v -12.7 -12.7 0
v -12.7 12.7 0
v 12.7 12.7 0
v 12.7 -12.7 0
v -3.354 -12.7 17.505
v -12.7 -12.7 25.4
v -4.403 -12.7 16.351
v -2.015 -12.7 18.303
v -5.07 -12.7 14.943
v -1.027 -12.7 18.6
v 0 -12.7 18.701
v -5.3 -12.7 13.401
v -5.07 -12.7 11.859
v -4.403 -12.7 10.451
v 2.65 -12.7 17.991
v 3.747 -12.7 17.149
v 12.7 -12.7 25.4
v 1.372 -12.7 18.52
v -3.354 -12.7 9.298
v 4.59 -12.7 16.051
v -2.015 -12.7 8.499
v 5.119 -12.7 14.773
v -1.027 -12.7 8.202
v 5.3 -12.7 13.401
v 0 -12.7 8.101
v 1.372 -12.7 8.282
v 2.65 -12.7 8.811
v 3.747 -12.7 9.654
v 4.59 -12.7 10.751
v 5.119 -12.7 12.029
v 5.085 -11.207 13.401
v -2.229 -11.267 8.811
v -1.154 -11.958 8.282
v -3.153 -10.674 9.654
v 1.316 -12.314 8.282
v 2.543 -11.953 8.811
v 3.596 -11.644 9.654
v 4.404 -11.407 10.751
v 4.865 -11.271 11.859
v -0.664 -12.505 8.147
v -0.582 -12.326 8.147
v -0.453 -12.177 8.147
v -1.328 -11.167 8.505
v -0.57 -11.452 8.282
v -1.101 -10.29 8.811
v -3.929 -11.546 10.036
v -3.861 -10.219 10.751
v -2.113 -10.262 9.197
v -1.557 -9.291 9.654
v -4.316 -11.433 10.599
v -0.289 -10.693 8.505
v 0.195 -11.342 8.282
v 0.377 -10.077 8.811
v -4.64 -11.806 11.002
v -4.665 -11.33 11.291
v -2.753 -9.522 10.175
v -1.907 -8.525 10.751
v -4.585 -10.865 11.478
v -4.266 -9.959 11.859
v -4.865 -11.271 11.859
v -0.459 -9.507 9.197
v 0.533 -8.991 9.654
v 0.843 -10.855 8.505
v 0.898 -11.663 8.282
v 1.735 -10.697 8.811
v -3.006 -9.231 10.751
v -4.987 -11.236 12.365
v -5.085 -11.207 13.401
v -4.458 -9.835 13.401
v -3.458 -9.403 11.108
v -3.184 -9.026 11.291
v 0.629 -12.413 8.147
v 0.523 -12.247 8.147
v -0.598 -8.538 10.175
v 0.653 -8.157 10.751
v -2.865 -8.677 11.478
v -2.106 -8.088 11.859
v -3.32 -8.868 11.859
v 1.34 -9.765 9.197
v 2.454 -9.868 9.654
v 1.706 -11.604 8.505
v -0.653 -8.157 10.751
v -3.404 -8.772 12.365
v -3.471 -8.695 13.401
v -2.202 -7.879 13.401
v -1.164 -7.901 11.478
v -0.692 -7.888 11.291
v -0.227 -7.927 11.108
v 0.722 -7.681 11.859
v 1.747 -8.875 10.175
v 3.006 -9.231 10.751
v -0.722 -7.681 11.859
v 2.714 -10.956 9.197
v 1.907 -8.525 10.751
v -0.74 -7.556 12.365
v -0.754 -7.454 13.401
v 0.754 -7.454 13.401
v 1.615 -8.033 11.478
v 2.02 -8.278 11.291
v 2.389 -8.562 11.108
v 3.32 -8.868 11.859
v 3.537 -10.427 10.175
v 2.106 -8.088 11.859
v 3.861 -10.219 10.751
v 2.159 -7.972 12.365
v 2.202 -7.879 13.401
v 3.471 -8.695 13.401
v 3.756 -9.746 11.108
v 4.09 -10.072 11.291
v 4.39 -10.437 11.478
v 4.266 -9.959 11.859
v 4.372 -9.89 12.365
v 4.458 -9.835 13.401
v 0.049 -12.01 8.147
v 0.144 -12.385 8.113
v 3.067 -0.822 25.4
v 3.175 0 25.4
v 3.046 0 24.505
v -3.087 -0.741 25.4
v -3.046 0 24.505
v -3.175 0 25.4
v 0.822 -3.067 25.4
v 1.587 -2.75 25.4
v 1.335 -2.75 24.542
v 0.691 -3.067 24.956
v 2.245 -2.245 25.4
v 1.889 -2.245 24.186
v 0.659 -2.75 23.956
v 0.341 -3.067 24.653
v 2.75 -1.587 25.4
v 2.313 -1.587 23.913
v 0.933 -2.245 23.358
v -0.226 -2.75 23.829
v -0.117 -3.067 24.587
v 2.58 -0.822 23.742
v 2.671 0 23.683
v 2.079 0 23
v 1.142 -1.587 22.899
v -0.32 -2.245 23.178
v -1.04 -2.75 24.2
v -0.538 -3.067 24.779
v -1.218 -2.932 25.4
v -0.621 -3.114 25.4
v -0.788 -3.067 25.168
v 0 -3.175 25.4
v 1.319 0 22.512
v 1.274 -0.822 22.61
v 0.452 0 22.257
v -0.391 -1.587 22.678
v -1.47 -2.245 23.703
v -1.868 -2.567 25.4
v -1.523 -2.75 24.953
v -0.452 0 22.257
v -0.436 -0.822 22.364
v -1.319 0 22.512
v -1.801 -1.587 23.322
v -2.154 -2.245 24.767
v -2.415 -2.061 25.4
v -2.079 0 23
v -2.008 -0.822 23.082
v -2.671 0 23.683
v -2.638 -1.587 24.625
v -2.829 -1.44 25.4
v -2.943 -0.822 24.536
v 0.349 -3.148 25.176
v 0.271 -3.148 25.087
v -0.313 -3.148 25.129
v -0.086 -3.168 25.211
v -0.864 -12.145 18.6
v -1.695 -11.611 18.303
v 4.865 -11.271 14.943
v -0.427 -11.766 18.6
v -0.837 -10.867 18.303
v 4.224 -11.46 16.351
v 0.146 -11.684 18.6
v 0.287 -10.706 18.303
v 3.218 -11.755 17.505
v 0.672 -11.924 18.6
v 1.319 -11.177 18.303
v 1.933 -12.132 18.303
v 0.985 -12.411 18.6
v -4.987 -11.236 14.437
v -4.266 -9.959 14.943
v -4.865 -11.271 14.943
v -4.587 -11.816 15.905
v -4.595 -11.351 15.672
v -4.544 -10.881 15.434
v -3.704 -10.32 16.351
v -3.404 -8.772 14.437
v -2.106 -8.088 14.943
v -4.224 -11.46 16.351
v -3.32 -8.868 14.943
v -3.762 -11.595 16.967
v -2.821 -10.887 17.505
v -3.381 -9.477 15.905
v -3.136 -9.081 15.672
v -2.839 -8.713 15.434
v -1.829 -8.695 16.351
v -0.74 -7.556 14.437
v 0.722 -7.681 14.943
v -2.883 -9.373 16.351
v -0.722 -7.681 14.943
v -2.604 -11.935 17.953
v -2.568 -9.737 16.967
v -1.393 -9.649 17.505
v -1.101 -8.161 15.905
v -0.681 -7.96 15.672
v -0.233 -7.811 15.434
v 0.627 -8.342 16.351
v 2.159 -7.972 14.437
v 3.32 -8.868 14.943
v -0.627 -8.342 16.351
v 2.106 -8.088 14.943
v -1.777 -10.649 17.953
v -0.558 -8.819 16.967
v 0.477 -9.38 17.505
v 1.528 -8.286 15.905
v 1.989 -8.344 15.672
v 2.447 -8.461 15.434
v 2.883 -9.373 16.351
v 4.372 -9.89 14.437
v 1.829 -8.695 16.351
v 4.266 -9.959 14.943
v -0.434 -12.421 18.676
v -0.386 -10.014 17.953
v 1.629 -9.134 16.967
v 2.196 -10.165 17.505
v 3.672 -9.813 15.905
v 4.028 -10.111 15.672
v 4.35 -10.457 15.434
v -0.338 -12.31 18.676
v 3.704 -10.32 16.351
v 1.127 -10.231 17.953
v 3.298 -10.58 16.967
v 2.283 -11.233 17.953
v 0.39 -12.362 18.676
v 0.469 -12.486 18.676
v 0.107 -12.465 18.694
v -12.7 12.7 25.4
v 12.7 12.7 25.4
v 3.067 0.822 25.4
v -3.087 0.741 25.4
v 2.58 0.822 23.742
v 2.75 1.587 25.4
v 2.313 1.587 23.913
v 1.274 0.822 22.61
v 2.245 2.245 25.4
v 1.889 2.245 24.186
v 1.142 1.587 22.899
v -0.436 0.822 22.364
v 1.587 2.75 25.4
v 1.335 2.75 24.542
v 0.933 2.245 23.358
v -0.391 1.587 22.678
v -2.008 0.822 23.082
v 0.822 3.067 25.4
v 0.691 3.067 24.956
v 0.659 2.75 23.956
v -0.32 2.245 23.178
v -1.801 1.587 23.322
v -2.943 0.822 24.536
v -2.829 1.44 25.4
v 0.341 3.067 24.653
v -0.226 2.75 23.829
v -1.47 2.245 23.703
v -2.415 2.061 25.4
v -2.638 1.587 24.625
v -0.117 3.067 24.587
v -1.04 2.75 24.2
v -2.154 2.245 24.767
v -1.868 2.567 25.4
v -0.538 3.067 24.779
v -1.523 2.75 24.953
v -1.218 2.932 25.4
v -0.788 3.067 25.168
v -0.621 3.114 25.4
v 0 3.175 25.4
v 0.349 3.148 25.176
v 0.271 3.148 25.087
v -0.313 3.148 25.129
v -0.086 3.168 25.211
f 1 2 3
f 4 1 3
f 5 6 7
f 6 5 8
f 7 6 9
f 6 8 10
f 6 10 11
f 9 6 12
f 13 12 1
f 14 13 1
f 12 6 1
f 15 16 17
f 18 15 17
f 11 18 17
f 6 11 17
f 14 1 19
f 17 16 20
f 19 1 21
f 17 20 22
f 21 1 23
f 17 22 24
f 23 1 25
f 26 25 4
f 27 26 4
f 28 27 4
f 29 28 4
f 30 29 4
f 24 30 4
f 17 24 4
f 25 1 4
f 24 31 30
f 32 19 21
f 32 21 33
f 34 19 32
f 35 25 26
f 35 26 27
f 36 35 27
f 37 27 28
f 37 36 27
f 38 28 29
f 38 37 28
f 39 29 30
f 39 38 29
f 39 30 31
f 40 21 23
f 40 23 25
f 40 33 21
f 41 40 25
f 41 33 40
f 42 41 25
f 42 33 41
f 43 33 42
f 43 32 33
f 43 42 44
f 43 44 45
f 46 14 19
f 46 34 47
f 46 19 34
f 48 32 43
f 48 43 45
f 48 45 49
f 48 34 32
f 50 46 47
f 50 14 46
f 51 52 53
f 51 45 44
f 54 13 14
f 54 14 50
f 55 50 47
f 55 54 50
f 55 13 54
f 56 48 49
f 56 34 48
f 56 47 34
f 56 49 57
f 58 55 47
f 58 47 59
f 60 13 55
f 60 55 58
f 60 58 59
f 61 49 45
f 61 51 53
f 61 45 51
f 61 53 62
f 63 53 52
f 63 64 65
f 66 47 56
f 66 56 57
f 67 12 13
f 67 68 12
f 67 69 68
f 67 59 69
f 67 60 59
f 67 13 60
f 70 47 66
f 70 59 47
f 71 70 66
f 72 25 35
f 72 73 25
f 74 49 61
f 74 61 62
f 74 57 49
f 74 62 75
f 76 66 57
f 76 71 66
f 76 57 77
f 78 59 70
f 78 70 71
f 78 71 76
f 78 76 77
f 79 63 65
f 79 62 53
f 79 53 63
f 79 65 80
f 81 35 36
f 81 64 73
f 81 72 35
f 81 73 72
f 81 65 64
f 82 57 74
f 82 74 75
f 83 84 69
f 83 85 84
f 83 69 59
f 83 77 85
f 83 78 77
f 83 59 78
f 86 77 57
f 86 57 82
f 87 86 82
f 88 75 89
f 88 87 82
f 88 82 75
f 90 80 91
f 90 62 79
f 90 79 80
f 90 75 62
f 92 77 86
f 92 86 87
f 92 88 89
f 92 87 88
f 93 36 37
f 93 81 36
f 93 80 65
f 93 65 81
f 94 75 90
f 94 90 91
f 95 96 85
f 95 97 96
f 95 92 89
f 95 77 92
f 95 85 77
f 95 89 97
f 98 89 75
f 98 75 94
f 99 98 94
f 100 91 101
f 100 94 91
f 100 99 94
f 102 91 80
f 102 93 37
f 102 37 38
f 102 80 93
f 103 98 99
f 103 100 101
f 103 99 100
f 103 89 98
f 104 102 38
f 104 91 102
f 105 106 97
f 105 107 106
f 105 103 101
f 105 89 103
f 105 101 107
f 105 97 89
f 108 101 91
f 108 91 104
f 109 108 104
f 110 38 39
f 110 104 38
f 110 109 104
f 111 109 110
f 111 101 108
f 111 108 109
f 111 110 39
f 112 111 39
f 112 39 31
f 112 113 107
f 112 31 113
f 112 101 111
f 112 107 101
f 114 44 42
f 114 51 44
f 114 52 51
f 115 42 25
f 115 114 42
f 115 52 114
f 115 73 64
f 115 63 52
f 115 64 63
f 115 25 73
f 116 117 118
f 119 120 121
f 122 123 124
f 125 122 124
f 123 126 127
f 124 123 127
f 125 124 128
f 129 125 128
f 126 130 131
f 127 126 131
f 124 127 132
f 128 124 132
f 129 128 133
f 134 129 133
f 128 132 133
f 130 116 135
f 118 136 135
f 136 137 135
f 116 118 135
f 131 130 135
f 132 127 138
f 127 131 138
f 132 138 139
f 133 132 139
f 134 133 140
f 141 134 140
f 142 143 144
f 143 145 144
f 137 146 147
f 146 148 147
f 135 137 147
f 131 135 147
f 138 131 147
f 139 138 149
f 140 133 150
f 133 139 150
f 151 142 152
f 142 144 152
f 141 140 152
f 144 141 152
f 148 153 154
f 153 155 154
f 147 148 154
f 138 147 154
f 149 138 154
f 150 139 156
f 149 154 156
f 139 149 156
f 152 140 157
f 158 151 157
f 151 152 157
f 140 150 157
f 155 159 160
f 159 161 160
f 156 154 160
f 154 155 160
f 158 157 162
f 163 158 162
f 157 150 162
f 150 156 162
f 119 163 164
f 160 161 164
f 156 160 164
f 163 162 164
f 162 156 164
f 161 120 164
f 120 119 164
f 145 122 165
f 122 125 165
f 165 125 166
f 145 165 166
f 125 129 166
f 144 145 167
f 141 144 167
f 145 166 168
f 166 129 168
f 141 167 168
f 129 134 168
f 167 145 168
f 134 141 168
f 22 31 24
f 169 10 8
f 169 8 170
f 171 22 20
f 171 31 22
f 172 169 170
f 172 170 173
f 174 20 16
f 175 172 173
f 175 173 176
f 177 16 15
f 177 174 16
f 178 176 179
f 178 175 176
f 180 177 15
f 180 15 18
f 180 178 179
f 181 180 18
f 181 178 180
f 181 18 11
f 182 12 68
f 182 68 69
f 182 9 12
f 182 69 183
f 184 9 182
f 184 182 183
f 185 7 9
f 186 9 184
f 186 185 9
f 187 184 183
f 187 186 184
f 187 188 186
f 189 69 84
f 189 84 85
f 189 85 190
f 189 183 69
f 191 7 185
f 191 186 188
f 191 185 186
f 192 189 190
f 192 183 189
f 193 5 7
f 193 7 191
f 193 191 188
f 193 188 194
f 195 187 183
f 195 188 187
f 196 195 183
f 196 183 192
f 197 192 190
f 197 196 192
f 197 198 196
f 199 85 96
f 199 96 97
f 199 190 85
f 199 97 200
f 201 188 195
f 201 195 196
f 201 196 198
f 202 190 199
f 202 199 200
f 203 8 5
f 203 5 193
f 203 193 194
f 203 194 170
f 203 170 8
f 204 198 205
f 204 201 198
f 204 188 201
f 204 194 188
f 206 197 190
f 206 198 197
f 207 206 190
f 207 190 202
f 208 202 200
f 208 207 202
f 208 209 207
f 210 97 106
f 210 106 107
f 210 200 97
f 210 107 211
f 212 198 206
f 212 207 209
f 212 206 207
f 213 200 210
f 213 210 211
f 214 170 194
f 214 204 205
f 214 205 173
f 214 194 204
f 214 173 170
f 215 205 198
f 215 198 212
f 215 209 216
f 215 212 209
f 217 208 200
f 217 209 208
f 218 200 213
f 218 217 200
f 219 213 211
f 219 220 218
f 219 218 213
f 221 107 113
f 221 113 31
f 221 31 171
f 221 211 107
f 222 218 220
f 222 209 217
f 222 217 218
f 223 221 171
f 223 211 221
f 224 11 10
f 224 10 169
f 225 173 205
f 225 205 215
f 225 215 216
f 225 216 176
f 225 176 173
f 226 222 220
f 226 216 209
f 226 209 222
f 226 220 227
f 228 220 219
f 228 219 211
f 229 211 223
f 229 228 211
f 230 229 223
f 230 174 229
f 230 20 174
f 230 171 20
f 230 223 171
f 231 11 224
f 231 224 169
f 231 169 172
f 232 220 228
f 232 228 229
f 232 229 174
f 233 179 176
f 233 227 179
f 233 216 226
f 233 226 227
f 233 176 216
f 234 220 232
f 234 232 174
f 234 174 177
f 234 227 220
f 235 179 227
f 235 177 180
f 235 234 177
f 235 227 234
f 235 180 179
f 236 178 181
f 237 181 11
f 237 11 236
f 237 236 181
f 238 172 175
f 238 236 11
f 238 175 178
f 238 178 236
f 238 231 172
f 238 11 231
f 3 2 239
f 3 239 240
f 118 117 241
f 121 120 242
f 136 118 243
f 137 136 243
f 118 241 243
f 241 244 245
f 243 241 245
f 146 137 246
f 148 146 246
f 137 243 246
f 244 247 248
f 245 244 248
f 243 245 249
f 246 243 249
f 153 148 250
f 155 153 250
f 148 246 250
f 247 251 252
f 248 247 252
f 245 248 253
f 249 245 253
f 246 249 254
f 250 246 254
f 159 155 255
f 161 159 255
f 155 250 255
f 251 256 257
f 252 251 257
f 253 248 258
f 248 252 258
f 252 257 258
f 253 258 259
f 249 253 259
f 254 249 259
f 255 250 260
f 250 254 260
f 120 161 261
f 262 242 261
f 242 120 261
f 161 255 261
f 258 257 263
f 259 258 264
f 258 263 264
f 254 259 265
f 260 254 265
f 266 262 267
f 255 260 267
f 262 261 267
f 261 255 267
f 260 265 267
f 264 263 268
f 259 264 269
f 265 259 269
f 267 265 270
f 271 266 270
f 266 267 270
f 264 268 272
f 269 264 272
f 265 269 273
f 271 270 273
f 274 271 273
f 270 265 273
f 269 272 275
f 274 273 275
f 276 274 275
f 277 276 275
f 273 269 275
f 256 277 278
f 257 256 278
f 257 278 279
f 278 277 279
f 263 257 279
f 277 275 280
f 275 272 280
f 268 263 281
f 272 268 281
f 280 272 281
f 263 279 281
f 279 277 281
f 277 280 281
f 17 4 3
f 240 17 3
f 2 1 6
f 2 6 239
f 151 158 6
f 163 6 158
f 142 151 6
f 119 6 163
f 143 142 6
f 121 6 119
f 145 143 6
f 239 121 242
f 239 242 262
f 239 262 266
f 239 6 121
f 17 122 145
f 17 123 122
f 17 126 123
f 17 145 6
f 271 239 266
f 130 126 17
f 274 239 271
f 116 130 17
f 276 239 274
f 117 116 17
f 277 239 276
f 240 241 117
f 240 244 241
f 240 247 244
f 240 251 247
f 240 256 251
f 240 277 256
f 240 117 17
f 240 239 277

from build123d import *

# Parameters (mm, degrees)
F0_W     = 25.4
F0_H     = 25.4
F1_DEPTH = 25.4


with BuildPart() as f1:
    # F0 (on Top) → F1 (new body)
    with BuildSketch(Plane.XY):
        Rectangle(F0_W, F0_H)
    extrude(amount=F1_DEPTH)

    # F2 (on face) → F3 (revolve, cut)
    with BuildSketch(Plane.XY.offset(25.4)):
        with BuildLine():
            ThreePointArc((0, -3.175), (2.245064, -2.245064), (3.175, 0))
            ThreePointArc((3.175, 0), (2.245064, 2.245064), (0, 3.175))
            Line((0, 3.175), (0, -3.175))
        make_face()
    revolve(axis=Axis((0, 0, 25.4), (0, 1, 0)), mode=Mode.SUBTRACT)

    # F4 (on face) → F5 (revolve, cut)
    with BuildSketch(Plane.XZ.offset(12.7)):
        with BuildLine():
            ThreePointArc((0, 8.101378), (3.747453, 9.653624), (5.299699, 13.401077))
            ThreePointArc((5.299699, 13.401077), (3.747453, 17.14853), (0, 18.700776))
            Line((0, 18.700776), (0, 8.101378))
        make_face()
    revolve(axis=Axis((0, -12.7, 13.401077), (0, 0, -1)), mode=Mode.SUBTRACT)


solid = f1.part
